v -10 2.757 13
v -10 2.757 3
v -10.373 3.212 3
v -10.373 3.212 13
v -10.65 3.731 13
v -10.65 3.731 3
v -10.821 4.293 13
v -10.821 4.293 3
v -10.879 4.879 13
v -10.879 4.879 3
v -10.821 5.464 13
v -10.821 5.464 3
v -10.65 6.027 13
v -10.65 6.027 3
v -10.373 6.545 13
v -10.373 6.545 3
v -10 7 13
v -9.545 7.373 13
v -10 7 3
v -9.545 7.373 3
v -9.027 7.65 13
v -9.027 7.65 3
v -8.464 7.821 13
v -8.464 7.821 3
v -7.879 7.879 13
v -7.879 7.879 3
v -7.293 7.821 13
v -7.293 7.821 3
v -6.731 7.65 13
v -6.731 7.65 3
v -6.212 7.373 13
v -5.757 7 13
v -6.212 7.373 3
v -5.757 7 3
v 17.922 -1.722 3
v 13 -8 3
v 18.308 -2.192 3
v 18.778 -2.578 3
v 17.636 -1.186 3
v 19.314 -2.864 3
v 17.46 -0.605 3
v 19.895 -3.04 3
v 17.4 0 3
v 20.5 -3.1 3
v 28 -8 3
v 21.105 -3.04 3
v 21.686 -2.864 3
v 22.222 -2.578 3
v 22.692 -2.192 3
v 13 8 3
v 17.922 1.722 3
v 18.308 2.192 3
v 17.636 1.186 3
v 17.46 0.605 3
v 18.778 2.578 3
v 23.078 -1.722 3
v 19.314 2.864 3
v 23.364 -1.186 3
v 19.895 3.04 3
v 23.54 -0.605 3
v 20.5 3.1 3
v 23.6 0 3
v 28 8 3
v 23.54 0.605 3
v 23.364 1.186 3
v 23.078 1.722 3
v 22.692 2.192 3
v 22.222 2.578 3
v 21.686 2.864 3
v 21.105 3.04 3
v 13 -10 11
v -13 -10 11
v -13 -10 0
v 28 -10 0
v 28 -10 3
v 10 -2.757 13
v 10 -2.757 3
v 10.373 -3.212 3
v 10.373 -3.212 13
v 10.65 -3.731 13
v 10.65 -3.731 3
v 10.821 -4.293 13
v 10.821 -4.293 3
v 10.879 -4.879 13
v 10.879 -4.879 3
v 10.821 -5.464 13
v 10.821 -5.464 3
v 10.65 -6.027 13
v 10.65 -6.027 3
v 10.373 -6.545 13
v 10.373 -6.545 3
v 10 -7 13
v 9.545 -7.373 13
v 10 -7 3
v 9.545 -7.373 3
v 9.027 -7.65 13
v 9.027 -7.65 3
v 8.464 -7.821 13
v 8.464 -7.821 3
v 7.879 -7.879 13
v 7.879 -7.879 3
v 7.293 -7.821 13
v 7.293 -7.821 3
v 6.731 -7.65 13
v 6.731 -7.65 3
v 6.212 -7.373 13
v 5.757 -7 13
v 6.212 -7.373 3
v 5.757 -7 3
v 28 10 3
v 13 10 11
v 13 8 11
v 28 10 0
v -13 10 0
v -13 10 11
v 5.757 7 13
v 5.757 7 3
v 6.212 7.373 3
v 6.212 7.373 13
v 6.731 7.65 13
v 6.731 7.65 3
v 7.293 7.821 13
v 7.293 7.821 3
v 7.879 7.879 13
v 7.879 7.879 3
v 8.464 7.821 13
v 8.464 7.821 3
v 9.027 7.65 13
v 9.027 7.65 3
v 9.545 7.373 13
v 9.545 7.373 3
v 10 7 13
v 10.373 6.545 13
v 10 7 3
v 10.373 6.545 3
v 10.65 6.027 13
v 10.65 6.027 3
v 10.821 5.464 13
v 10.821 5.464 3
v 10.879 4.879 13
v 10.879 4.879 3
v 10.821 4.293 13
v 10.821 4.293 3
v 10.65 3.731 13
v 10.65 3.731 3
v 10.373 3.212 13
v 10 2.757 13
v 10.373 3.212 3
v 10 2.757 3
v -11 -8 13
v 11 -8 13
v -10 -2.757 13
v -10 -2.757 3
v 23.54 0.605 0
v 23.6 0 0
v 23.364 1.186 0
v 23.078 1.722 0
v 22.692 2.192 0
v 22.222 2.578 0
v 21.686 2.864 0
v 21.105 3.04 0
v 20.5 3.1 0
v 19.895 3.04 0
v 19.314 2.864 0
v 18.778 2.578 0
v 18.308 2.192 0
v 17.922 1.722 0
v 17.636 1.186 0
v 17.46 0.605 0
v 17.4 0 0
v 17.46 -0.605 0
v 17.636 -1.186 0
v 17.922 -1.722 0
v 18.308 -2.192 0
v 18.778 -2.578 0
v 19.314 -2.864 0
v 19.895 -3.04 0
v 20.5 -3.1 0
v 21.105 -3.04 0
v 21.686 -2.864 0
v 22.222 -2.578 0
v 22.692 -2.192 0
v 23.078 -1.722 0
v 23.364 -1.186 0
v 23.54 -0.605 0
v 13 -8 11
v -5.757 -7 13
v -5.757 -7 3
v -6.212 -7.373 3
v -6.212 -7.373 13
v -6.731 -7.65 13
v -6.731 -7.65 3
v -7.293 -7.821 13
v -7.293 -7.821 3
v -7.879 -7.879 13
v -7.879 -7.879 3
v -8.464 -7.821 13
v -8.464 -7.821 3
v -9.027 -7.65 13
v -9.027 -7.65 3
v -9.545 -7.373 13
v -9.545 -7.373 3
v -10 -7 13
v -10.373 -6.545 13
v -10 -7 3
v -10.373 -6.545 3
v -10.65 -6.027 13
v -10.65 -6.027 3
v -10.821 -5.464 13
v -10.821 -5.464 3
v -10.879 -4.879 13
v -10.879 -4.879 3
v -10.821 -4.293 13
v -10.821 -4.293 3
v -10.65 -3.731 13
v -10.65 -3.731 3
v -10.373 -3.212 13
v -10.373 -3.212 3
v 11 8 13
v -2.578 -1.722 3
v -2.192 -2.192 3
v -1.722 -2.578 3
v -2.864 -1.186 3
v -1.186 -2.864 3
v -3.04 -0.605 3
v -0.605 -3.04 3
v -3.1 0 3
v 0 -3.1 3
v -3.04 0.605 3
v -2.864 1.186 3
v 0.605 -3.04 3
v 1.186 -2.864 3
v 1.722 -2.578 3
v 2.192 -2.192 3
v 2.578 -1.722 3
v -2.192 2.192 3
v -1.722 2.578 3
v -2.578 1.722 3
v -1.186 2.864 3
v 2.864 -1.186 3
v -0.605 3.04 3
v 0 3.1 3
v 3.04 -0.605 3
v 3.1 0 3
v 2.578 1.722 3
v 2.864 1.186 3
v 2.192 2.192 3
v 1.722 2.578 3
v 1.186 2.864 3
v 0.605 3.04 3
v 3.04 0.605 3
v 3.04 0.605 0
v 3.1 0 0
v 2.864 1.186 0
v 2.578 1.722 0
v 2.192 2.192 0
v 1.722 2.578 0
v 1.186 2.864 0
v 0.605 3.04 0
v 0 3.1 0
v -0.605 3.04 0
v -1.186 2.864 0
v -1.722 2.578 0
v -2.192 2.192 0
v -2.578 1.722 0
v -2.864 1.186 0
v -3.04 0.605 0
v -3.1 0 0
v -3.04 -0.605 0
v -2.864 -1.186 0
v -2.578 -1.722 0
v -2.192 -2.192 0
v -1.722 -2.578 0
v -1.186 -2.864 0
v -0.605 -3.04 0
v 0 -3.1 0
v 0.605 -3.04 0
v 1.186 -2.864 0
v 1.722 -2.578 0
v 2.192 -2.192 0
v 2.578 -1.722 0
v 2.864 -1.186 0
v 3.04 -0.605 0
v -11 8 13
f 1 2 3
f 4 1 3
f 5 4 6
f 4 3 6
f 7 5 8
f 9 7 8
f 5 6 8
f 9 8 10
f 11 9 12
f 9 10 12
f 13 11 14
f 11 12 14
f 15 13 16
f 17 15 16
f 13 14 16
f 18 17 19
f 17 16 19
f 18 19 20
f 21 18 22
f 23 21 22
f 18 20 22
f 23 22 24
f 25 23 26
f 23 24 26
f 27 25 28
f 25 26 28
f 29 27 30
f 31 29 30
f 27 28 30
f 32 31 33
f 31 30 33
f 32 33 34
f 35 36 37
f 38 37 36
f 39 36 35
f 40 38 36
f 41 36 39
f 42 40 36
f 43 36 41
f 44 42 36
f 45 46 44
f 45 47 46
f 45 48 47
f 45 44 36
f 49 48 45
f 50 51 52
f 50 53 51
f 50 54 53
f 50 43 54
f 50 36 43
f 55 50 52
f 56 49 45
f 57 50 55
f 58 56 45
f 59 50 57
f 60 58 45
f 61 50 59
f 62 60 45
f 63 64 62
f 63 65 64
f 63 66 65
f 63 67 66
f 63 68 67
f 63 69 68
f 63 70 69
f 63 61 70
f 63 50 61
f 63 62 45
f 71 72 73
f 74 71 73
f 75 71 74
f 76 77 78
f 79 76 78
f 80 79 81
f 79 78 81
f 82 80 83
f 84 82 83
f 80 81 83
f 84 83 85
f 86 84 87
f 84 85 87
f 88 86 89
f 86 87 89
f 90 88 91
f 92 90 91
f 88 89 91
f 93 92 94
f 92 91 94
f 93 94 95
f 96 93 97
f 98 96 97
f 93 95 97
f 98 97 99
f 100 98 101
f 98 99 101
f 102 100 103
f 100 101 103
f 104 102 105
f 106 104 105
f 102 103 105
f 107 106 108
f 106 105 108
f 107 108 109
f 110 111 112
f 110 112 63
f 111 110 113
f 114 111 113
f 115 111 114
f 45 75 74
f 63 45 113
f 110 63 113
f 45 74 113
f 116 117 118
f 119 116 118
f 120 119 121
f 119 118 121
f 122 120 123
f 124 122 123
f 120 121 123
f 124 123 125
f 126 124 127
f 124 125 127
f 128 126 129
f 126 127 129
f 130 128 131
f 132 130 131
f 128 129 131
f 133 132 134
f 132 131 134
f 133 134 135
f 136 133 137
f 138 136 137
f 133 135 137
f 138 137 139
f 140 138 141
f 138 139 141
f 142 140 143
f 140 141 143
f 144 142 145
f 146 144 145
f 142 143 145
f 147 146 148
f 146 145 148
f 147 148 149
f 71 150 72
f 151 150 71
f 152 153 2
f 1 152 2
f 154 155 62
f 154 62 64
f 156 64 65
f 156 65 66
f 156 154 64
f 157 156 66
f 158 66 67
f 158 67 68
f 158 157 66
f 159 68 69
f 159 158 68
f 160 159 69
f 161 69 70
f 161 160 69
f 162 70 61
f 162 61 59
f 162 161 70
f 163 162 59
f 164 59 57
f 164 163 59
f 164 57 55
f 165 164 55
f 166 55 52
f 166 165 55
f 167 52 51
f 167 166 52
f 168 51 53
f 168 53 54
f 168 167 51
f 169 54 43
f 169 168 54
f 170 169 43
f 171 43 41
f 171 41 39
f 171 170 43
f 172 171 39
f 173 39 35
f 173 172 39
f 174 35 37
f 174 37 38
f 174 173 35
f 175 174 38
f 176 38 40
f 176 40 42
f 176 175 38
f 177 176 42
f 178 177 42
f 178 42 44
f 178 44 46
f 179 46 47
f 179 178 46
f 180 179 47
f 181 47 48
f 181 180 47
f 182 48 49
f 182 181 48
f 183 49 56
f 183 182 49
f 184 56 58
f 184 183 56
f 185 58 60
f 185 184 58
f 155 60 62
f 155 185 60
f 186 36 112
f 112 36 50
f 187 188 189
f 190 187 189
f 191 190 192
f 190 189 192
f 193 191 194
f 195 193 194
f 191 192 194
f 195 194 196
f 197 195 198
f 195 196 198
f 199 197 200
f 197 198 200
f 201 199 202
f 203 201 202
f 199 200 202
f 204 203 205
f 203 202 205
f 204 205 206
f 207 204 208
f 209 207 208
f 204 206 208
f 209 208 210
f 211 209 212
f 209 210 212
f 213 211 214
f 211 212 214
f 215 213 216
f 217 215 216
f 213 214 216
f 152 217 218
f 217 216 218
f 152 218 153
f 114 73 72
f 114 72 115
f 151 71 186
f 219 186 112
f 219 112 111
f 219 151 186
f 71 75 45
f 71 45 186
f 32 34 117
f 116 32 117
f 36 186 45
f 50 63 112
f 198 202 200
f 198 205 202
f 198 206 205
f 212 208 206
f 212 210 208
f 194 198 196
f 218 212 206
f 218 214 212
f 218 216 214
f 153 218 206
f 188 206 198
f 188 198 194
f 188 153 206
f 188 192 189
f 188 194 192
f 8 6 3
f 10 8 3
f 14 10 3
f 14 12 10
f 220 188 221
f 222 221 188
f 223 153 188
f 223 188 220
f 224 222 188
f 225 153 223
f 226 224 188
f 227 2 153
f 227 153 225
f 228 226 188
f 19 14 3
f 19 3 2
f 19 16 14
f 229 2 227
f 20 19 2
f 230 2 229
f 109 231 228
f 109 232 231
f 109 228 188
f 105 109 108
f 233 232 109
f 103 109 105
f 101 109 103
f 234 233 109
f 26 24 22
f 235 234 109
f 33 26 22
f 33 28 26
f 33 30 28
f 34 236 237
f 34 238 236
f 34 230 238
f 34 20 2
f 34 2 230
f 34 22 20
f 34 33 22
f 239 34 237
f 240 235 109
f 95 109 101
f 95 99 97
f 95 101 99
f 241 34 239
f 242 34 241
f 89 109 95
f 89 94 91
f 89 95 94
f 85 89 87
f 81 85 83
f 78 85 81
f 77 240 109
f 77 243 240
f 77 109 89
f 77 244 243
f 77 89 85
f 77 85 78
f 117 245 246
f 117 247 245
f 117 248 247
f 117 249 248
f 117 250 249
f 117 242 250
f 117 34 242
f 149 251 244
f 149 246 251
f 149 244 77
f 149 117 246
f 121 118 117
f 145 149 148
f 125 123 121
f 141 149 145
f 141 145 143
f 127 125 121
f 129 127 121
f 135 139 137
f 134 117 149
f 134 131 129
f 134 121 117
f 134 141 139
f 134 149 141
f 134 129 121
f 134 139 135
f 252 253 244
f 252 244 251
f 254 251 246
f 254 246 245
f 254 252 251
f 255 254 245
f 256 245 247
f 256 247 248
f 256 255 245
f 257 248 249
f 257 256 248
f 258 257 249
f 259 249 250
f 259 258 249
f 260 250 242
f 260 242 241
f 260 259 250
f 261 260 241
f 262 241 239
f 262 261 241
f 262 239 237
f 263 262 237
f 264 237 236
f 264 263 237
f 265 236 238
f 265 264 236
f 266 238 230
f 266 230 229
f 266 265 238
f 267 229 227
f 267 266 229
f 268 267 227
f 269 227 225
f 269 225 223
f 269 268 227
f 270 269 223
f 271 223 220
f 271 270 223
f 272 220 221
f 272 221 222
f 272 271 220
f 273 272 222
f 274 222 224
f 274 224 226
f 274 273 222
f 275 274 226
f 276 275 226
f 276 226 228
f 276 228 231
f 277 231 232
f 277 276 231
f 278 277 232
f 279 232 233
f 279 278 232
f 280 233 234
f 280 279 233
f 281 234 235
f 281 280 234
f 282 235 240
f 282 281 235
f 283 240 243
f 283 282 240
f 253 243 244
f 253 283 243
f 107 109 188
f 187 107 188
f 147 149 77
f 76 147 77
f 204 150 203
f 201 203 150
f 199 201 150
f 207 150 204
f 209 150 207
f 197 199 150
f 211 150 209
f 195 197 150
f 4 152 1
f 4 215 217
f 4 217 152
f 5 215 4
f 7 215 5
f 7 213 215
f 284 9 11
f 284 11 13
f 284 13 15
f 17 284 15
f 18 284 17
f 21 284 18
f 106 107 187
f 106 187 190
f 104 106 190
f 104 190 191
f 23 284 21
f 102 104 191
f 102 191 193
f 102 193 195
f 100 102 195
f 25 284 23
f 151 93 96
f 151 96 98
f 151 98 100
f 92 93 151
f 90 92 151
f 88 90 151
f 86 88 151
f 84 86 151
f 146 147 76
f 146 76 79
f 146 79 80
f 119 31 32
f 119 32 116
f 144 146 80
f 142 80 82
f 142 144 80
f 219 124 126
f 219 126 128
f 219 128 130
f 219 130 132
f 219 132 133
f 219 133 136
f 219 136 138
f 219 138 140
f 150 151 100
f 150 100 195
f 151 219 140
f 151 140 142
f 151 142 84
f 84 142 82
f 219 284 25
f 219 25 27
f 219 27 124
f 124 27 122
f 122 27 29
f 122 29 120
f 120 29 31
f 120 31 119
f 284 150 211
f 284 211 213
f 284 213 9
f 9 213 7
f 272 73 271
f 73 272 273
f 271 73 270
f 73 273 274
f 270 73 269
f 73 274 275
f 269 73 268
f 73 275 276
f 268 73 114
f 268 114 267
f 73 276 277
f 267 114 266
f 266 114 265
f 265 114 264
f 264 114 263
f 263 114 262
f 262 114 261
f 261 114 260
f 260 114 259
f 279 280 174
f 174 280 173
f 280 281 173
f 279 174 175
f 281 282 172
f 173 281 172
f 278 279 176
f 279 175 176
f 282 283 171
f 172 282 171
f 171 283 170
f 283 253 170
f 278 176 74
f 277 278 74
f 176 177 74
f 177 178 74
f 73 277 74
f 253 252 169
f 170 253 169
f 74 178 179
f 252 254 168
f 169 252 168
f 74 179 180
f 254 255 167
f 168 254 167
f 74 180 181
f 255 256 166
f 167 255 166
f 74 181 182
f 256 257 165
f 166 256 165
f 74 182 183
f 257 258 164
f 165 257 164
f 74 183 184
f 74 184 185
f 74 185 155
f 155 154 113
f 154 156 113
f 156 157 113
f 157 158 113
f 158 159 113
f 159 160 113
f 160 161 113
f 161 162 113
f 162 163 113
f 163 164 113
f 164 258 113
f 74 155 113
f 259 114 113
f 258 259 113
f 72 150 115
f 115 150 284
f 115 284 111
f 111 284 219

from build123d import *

# Parameters (mm, degrees)
F0_R     = 3.1
F1_DEPTH = 3
F2_W     = 26
F2_H     = 20
F3_DEPTH = 10
F4_SIZE  = 2
F6_DEPTH = 2
F8_DEPTH = 2


with BuildPart() as f1:
    # F0 (on Top) → F1 (new body)
    with BuildSketch(Plane.XY):
        Polygon((-13, -10), (13, -10), (28, -10), (28, 10), (13, 10), (-13, 10), align=None)
        Circle(F0_R, mode=Mode.SUBTRACT)
        with Locations((20.5, 0)):
            Circle(F0_R, mode=Mode.SUBTRACT)
    extrude(amount=F1_DEPTH)

    # F2 (on face) → F3 (join)
    with BuildSketch(Plane.XY.offset(3)):
        Rectangle(F2_W, F2_H)
        with BuildLine():
            ThreePointArc((-10, 2.757359), (-10, 7), (-5.757359, 7))
            Line((-5.757359, 7), (5.757359, 7))
            ThreePointArc((5.757359, 7), (10, 7), (10, 2.757359))
            Line((10, 2.757359), (10, -2.757359))
            ThreePointArc((10, -2.757359), (10, -7), (5.757359, -7))
            Line((5.757359, -7), (-5.757359, -7))
            ThreePointArc((-5.757359, -7), (-10, -7), (-10, -2.757359))
            Line((-10, -2.757359), (-10, 2.757359))
        make_face(mode=Mode.SUBTRACT)
    extrude(amount=F3_DEPTH)

    # F4
    f4_edges = [f1.edges().sort_by_distance(p)[0] for p in [
        (0, -10, 13),
        (13, 0, 13),
        (0, 10, 13),
        (-13, 0, 13),
    ]]
    chamfer(f4_edges, length=F4_SIZE)

    # F5 (on face) → F6 (join)
    with BuildSketch(Plane.XZ.offset(10)):
        Polygon((28, 3), (13, 11), (13, 3), align=None)
    extrude(amount=-F6_DEPTH)

    # F7 (on face) → F8 (join)
    with BuildSketch(Plane(origin=(0, 10, 0), x_dir=(-1, 0, 0), z_dir=(0, 1, 0))):
        Polygon((-13, 3), (-13, 11), (-28, 3), align=None)
    extrude(amount=-F8_DEPTH)


solid = f1.part
